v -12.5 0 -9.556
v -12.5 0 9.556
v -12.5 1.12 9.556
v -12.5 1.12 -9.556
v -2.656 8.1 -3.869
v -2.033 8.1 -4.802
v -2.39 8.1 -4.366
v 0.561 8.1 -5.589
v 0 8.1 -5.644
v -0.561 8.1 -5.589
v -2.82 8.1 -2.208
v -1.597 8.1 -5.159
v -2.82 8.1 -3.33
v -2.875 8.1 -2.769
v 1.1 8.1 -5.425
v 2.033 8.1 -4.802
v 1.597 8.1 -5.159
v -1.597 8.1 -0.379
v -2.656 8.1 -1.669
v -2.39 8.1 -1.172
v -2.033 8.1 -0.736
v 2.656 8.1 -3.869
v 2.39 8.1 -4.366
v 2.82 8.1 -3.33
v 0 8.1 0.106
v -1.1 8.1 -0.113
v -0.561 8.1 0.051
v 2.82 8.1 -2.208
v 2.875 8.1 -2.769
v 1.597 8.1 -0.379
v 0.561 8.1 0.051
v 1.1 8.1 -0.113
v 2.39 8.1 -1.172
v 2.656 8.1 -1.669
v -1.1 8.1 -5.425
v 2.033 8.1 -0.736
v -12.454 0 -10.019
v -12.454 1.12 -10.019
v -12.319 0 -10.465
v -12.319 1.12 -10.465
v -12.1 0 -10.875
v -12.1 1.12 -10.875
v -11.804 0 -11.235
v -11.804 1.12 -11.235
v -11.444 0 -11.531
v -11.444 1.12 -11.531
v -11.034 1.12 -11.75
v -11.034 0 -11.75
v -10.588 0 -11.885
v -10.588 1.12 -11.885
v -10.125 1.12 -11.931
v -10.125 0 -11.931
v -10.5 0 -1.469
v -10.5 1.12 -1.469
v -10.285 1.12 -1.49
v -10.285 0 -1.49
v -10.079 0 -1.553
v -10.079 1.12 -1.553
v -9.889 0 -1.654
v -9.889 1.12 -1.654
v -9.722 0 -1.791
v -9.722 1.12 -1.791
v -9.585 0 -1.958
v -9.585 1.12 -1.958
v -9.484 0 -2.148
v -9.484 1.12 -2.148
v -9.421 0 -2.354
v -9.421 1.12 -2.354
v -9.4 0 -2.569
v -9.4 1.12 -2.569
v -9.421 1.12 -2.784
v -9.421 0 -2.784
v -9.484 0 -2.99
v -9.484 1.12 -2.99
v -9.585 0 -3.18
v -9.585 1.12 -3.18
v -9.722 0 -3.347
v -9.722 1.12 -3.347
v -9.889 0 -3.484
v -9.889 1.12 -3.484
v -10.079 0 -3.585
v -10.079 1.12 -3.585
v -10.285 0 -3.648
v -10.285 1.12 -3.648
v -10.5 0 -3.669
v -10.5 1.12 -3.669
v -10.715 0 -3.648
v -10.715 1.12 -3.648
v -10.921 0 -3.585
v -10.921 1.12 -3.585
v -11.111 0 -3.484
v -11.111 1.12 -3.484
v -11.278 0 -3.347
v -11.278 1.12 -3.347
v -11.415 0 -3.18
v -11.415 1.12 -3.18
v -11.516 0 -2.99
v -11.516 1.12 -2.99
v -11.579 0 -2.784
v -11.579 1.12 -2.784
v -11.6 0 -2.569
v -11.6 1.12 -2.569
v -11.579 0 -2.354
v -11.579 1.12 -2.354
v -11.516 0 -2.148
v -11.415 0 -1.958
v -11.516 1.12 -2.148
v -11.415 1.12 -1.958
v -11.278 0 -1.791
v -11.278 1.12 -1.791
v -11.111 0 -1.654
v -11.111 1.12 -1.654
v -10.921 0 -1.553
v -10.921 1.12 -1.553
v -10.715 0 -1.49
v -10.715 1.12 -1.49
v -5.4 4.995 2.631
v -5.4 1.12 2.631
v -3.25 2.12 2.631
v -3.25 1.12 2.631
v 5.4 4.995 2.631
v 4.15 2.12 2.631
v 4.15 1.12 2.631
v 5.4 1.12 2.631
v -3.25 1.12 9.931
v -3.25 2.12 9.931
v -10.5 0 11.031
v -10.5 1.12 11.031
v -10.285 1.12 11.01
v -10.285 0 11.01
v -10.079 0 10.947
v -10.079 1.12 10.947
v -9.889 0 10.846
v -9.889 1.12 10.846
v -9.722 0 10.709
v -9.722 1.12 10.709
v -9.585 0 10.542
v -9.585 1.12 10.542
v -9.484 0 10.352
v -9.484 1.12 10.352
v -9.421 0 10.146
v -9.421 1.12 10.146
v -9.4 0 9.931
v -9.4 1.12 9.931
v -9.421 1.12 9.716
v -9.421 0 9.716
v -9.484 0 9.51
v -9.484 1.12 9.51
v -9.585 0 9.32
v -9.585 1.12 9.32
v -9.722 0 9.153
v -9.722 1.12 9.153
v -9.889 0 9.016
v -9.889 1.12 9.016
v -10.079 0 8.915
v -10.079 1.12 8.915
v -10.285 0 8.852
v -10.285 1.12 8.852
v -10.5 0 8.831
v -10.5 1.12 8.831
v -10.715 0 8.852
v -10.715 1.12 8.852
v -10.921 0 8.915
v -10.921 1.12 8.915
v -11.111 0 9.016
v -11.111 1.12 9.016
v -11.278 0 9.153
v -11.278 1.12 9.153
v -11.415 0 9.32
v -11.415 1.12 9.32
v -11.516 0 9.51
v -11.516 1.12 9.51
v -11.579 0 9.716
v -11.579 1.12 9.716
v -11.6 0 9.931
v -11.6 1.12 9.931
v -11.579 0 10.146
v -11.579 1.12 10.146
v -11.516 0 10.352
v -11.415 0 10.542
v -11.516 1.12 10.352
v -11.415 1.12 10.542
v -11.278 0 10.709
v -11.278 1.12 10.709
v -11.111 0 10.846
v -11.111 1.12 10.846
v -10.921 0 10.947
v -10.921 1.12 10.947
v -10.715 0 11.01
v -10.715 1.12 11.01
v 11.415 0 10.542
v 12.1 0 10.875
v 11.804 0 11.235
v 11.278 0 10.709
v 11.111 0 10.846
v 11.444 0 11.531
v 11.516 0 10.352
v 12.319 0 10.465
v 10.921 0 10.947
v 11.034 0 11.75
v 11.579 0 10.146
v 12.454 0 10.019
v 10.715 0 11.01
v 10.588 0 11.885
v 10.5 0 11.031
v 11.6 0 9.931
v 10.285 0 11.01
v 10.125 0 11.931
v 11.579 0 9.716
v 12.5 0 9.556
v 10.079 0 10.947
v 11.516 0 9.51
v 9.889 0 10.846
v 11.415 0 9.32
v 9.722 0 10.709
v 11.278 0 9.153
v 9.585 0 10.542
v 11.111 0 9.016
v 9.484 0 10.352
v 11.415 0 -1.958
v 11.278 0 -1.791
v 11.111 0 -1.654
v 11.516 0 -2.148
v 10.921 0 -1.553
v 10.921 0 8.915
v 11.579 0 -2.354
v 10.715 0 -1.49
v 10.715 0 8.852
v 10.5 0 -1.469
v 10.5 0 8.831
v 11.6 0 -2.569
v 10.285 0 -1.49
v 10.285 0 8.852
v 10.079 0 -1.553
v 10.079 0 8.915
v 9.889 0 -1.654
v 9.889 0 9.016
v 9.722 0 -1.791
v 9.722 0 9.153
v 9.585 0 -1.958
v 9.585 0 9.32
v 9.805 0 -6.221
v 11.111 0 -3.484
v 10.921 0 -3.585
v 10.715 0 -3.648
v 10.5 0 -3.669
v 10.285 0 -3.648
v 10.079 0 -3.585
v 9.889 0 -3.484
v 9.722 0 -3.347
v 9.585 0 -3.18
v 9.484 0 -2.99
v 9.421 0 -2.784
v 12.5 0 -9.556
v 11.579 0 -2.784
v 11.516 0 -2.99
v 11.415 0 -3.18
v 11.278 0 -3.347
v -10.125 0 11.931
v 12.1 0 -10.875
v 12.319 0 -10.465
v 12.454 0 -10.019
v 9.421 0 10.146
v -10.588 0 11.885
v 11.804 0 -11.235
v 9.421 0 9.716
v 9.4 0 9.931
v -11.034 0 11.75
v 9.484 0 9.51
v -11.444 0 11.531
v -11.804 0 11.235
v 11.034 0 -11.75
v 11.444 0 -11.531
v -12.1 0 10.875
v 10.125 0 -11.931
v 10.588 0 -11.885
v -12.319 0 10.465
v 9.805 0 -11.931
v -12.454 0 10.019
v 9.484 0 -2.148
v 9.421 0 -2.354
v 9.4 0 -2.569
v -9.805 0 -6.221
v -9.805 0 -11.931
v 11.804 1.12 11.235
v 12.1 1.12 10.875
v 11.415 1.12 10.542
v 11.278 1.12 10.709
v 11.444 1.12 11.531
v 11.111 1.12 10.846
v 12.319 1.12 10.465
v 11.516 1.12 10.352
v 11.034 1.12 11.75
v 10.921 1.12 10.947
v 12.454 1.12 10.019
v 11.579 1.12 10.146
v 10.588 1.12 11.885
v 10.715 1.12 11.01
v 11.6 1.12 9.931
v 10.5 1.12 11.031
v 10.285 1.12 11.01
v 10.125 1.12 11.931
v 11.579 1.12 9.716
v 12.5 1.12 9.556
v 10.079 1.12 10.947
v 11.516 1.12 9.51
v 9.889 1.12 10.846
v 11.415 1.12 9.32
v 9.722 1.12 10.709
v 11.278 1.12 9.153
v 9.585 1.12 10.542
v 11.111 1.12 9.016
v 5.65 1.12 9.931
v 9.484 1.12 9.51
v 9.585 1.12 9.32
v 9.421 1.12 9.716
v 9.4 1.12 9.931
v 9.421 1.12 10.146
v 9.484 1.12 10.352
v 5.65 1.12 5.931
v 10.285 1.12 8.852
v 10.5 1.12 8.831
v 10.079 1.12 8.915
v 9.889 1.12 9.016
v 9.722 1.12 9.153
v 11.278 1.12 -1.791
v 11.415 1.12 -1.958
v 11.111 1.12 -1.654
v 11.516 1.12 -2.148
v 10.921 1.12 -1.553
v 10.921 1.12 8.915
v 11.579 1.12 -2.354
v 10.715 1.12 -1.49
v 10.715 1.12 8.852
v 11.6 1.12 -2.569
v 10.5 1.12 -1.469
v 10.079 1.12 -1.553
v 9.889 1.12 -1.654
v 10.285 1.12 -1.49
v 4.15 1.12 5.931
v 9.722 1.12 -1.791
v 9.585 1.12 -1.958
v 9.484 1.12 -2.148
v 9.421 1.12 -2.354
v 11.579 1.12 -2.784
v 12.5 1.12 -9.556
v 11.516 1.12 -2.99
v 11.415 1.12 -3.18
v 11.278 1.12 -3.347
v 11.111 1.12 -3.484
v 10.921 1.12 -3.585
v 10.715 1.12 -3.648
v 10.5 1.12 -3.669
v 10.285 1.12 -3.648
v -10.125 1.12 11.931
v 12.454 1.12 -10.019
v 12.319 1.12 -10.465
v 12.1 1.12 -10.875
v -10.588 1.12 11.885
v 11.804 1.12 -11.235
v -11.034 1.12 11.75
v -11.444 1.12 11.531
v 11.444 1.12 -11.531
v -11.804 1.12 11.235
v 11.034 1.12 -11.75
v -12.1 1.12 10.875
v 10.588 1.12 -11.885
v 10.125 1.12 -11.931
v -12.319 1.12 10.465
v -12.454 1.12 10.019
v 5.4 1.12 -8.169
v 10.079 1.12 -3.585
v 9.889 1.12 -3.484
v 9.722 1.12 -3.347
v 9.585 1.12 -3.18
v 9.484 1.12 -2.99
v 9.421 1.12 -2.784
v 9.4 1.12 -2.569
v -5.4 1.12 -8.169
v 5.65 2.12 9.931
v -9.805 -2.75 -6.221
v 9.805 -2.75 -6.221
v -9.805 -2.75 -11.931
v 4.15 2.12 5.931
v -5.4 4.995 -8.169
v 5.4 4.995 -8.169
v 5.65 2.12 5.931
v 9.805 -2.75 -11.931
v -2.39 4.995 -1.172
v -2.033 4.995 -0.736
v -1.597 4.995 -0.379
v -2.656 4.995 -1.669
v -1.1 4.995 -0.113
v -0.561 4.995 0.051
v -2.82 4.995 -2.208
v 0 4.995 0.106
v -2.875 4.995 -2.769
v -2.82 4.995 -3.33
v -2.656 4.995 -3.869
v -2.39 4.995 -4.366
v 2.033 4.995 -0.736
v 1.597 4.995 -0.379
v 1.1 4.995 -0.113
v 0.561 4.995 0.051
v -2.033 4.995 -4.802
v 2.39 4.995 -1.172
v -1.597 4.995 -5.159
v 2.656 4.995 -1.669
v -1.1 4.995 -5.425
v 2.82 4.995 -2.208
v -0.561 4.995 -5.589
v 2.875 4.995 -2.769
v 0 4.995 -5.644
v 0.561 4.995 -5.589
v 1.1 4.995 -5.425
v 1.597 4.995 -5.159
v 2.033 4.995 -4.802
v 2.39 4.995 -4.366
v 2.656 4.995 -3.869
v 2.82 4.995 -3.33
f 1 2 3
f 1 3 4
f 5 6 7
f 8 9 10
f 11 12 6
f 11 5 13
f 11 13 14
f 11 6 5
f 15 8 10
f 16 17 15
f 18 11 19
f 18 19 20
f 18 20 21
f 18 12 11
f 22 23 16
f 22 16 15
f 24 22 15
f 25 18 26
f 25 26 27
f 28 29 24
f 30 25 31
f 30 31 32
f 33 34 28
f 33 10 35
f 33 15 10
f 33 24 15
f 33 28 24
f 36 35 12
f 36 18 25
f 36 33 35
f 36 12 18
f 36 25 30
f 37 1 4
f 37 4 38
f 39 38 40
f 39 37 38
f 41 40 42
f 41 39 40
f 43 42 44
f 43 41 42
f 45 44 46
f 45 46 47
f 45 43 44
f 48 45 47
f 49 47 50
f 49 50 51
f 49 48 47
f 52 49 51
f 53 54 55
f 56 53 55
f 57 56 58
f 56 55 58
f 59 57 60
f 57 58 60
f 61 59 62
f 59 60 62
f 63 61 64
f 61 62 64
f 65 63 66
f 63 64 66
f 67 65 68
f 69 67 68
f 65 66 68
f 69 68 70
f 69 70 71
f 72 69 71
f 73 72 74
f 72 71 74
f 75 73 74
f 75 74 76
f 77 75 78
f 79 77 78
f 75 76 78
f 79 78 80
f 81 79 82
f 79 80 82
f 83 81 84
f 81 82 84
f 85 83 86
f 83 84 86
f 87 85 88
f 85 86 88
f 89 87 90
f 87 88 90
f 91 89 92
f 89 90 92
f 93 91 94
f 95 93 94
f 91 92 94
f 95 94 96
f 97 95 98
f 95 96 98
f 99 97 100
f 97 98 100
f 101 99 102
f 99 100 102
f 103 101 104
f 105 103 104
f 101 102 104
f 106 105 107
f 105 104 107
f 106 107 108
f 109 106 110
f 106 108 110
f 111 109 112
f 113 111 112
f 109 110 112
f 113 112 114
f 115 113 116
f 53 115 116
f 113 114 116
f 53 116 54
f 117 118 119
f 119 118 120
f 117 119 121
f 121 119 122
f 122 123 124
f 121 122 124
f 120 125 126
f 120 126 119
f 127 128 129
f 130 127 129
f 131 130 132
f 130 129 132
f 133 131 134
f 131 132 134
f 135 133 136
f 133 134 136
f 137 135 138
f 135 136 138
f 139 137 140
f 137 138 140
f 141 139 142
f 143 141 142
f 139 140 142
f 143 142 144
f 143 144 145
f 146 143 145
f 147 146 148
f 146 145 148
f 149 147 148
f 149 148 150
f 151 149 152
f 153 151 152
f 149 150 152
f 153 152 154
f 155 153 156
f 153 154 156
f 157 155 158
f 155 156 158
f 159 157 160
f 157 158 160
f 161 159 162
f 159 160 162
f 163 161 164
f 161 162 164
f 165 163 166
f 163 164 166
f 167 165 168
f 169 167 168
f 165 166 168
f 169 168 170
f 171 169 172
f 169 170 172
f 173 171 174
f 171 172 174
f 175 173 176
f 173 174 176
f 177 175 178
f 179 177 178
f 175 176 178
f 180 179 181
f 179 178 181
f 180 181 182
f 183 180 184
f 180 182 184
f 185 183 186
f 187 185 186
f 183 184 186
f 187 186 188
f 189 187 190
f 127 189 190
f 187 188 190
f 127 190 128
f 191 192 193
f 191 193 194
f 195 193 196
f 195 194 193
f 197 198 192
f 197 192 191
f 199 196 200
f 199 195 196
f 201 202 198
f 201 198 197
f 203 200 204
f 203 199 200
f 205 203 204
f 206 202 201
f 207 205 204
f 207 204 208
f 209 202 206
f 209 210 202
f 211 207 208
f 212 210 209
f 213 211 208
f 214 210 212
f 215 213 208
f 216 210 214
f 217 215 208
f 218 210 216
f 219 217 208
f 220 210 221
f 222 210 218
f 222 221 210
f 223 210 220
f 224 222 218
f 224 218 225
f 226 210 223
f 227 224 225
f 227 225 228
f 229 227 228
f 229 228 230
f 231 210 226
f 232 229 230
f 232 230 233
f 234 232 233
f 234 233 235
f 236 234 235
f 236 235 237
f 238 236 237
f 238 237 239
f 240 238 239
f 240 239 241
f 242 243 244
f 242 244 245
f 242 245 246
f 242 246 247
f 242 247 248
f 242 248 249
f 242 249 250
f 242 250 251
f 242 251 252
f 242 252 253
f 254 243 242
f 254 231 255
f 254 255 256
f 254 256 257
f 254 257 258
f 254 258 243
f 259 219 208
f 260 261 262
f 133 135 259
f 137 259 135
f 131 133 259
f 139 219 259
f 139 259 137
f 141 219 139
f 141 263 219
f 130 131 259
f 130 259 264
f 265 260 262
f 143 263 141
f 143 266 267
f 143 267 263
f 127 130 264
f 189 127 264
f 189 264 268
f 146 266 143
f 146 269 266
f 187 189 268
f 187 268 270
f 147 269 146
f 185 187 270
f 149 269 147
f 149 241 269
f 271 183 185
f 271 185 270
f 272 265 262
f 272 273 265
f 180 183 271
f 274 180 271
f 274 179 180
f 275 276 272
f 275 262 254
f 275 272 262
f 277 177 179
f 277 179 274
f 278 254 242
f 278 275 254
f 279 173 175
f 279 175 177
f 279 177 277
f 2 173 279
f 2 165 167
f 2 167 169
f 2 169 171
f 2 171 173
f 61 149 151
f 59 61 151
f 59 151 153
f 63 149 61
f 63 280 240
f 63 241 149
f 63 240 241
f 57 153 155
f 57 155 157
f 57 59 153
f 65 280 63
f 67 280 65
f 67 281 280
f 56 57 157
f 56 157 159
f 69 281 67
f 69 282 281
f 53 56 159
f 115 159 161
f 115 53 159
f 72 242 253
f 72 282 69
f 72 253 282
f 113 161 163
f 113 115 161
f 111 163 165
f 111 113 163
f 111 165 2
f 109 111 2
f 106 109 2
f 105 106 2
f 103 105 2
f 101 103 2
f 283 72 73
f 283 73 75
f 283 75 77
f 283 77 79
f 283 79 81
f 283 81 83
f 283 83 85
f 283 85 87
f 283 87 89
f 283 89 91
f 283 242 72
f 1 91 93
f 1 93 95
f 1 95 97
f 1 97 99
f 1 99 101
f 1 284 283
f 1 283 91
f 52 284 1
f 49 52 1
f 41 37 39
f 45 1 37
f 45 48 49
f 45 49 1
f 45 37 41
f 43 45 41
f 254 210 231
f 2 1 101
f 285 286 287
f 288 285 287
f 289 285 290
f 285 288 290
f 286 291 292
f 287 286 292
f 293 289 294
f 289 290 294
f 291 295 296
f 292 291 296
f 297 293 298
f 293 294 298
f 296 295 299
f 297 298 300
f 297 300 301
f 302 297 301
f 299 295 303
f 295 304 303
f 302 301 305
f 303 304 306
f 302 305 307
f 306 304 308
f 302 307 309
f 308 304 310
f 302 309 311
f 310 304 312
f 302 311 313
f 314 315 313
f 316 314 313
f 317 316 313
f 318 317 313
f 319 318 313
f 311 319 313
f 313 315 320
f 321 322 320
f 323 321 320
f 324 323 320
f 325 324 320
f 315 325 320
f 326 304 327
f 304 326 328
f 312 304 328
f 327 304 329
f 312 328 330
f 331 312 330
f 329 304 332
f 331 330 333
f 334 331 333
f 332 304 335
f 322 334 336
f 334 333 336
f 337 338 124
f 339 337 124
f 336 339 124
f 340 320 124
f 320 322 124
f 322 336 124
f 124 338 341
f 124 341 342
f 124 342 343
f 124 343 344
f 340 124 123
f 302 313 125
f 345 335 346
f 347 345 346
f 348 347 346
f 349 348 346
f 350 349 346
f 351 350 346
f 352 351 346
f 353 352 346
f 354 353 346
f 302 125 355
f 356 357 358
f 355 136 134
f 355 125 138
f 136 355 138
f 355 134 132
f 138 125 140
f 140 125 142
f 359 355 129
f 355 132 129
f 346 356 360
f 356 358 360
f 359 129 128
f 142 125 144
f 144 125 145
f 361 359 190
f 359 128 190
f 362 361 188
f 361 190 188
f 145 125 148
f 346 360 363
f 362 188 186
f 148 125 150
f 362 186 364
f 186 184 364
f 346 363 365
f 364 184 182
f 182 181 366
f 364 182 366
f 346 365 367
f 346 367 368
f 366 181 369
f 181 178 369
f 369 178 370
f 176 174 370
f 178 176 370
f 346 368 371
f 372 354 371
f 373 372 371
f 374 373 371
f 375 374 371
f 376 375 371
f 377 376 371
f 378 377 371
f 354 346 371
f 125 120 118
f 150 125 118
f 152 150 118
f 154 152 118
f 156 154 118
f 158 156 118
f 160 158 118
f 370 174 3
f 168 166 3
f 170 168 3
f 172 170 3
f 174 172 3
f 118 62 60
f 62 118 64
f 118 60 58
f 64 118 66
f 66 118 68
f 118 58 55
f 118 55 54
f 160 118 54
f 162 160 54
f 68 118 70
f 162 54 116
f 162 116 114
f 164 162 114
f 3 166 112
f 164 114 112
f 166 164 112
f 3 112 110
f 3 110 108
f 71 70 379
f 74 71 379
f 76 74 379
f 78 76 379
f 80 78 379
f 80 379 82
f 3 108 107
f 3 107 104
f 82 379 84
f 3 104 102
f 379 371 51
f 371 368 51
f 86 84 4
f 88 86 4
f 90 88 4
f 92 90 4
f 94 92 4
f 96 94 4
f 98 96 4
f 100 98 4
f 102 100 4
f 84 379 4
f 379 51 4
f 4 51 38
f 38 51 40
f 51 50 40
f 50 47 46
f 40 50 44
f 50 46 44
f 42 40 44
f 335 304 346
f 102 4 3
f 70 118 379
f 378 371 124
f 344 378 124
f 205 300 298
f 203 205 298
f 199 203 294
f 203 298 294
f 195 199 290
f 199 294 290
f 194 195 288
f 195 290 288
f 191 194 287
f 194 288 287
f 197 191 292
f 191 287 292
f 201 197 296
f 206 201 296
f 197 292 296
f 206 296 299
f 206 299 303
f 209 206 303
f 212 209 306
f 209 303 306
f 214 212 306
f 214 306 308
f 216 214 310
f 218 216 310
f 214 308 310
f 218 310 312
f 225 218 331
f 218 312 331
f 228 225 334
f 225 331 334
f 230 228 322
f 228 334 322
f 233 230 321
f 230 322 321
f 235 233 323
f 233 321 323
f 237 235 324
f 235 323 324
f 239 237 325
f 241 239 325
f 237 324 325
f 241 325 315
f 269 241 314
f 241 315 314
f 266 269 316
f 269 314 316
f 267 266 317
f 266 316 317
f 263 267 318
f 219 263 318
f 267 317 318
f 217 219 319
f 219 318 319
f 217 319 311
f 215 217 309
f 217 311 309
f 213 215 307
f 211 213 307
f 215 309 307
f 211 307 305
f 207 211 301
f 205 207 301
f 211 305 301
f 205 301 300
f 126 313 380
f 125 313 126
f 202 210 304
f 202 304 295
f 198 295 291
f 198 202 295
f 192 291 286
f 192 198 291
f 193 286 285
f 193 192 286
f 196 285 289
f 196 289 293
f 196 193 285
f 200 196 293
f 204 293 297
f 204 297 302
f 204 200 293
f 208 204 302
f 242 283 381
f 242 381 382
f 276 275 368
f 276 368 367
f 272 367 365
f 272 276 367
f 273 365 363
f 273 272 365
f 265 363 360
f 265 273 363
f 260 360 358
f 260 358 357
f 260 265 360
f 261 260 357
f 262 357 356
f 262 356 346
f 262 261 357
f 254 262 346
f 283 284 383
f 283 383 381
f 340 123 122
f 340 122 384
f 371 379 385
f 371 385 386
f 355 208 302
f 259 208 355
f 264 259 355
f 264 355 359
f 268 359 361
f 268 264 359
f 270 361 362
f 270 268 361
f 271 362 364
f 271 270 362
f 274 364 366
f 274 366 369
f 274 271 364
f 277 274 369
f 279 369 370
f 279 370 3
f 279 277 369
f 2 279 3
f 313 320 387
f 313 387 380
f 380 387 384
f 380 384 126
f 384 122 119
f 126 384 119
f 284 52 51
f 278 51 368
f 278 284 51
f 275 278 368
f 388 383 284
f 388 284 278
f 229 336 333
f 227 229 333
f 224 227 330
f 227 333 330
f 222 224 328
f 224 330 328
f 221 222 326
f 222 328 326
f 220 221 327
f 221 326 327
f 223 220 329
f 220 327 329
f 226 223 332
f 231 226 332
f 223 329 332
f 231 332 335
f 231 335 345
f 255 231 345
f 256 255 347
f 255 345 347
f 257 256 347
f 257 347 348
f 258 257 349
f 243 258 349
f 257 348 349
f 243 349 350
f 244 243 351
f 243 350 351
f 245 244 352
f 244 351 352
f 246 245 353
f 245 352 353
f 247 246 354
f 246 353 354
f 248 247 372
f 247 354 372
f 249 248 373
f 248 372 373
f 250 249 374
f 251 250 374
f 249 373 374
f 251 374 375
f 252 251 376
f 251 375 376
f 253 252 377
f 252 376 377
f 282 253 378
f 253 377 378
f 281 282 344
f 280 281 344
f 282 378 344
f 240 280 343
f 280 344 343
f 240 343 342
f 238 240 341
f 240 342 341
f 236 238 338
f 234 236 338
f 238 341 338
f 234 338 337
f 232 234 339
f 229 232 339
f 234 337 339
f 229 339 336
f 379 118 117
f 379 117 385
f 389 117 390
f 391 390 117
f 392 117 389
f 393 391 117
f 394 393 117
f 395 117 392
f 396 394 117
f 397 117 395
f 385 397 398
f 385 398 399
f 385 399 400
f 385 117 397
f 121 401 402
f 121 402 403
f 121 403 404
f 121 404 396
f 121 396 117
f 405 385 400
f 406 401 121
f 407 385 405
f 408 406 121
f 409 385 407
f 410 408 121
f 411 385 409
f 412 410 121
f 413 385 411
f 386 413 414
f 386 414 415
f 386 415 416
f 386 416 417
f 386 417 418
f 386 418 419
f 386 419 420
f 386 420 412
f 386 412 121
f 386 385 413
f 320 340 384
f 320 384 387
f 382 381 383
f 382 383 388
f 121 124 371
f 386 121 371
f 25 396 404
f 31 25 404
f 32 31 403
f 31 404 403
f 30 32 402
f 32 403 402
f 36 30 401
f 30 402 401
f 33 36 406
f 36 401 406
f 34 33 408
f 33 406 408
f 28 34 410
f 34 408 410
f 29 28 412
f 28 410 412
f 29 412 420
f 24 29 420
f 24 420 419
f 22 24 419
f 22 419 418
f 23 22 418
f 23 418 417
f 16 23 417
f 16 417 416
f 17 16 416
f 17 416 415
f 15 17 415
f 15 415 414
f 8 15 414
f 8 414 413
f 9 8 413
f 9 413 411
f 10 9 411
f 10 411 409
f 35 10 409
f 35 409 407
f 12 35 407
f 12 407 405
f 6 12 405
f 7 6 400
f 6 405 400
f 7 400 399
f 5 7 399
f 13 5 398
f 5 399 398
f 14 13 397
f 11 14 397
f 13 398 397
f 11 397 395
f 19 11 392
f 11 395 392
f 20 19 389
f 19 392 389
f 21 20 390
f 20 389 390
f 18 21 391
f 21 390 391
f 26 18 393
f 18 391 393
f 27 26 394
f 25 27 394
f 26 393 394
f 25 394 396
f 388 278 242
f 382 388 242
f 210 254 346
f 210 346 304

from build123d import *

# Parameters (mm, degrees)
MAINBOARD_DEPTH     = 1.12
SKETCH2_R           = 1.1
BOARDHOLES_DEPTH    = 1.12
CAMBOD_W            = 10.8
CAMBOD_H            = 10.8
CAM_BASE_DEPTH      = 3.875
CAMLENS_START       = -3.875
SKETCH4_R           = 2.875
CAMLENS_DEPTH       = 6.98
SKETCH5_W           = 19.61
SKETCH5_H           = 5.71
RIBBON_PORT_DEPTH   = 2.75
LITTLE_MODULE_DEPTH = 1


with BuildPart() as part:
    # Sketch1 → MainBoard (new body)
    with BuildSketch(Plane(origin=(0, 0, 0), x_dir=(1, 0, 0), z_dir=(0, 1, 0))):
        with BuildLine():
            Line((-10.125, 11.931), (10.125, 11.931))
            ThreePointArc((10.125, 11.931), (11.804378605, 11.235378605), (12.5, 9.556))
            Line((12.5, 9.556), (12.5, -9.556))
            ThreePointArc((12.5, -9.556), (11.804378605, -11.235378605), (10.125, -11.931))
            Line((10.125, -11.931), (-10.125, -11.931))
            ThreePointArc((-10.125, -11.931), (-11.804378605, -11.235378605), (-12.5, -9.556))
            Line((-12.5, -9.556), (-12.5, 9.556))
            ThreePointArc((-12.5, 9.556), (-11.804378605, 11.235378605), (-10.125, 11.931))
        make_face()
    extrude(amount=MAINBOARD_DEPTH)

    # Sketch2 → BoardHoles (cut)
    with BuildSketch(Plane(origin=(0, 1.12, 0), x_dir=(1, 0, 0), z_dir=(0, 1, 0))):
        with Locations(Location((-10.5, -9.931, 0), (0, 0, 270))):
            Circle(SKETCH2_R)
        with Locations(Location((-10.5, 2.569, 0), (0, 0, 270))):
            Circle(SKETCH2_R)
        with Locations(Location((10.5, -9.931, 0), (0, 0, 270))):
            Circle(SKETCH2_R)
        with Locations(Location((10.5, 2.569, 0), (0, 0, 270))):
            Circle(SKETCH2_R)
    extrude(amount=-BOARDHOLES_DEPTH, mode=Mode.SUBTRACT)

    # CamBod → Cam Base (add)
    with BuildSketch(Plane(origin=(0, 1.12, 0), x_dir=(1, 0, 0), z_dir=(0, 1, 0))):
        with Locations((0, 2.769)):
            Rectangle(CAMBOD_W, CAMBOD_H)
    extrude(amount=CAM_BASE_DEPTH)

    # Sketch4 → CamLens (add)
    with BuildSketch(Plane(origin=(0, 4.995, 0), x_dir=(1, 0, 0), z_dir=(0, 1, 0)).offset(CAMLENS_START)):
        with Locations(Location((0, 2.769, 0), (0, 0, 270))):
            Circle(SKETCH4_R)
    extrude(amount=CAMLENS_DEPTH)

    # Sketch5 → Ribbon Port (add)
    with BuildSketch(Plane.XZ):
        with Locations((0, -9.076)):
            Rectangle(SKETCH5_W, SKETCH5_H)
    extrude(amount=RIBBON_PORT_DEPTH)

    # Sketch6 → Little Module (add)
    with BuildSketch(Plane(origin=(0, 1.12, 0), x_dir=(1, 0, 0), z_dir=(0, 1, 0))):
        Polygon((-3.25, -9.931), (-3.25, -2.631), (4.15, -2.631), (4.15, -5.931), (5.65, -5.931), (5.65, -9.931), align=None)
    extrude(amount=LITTLE_MODULE_DEPTH)


solid = part.part
